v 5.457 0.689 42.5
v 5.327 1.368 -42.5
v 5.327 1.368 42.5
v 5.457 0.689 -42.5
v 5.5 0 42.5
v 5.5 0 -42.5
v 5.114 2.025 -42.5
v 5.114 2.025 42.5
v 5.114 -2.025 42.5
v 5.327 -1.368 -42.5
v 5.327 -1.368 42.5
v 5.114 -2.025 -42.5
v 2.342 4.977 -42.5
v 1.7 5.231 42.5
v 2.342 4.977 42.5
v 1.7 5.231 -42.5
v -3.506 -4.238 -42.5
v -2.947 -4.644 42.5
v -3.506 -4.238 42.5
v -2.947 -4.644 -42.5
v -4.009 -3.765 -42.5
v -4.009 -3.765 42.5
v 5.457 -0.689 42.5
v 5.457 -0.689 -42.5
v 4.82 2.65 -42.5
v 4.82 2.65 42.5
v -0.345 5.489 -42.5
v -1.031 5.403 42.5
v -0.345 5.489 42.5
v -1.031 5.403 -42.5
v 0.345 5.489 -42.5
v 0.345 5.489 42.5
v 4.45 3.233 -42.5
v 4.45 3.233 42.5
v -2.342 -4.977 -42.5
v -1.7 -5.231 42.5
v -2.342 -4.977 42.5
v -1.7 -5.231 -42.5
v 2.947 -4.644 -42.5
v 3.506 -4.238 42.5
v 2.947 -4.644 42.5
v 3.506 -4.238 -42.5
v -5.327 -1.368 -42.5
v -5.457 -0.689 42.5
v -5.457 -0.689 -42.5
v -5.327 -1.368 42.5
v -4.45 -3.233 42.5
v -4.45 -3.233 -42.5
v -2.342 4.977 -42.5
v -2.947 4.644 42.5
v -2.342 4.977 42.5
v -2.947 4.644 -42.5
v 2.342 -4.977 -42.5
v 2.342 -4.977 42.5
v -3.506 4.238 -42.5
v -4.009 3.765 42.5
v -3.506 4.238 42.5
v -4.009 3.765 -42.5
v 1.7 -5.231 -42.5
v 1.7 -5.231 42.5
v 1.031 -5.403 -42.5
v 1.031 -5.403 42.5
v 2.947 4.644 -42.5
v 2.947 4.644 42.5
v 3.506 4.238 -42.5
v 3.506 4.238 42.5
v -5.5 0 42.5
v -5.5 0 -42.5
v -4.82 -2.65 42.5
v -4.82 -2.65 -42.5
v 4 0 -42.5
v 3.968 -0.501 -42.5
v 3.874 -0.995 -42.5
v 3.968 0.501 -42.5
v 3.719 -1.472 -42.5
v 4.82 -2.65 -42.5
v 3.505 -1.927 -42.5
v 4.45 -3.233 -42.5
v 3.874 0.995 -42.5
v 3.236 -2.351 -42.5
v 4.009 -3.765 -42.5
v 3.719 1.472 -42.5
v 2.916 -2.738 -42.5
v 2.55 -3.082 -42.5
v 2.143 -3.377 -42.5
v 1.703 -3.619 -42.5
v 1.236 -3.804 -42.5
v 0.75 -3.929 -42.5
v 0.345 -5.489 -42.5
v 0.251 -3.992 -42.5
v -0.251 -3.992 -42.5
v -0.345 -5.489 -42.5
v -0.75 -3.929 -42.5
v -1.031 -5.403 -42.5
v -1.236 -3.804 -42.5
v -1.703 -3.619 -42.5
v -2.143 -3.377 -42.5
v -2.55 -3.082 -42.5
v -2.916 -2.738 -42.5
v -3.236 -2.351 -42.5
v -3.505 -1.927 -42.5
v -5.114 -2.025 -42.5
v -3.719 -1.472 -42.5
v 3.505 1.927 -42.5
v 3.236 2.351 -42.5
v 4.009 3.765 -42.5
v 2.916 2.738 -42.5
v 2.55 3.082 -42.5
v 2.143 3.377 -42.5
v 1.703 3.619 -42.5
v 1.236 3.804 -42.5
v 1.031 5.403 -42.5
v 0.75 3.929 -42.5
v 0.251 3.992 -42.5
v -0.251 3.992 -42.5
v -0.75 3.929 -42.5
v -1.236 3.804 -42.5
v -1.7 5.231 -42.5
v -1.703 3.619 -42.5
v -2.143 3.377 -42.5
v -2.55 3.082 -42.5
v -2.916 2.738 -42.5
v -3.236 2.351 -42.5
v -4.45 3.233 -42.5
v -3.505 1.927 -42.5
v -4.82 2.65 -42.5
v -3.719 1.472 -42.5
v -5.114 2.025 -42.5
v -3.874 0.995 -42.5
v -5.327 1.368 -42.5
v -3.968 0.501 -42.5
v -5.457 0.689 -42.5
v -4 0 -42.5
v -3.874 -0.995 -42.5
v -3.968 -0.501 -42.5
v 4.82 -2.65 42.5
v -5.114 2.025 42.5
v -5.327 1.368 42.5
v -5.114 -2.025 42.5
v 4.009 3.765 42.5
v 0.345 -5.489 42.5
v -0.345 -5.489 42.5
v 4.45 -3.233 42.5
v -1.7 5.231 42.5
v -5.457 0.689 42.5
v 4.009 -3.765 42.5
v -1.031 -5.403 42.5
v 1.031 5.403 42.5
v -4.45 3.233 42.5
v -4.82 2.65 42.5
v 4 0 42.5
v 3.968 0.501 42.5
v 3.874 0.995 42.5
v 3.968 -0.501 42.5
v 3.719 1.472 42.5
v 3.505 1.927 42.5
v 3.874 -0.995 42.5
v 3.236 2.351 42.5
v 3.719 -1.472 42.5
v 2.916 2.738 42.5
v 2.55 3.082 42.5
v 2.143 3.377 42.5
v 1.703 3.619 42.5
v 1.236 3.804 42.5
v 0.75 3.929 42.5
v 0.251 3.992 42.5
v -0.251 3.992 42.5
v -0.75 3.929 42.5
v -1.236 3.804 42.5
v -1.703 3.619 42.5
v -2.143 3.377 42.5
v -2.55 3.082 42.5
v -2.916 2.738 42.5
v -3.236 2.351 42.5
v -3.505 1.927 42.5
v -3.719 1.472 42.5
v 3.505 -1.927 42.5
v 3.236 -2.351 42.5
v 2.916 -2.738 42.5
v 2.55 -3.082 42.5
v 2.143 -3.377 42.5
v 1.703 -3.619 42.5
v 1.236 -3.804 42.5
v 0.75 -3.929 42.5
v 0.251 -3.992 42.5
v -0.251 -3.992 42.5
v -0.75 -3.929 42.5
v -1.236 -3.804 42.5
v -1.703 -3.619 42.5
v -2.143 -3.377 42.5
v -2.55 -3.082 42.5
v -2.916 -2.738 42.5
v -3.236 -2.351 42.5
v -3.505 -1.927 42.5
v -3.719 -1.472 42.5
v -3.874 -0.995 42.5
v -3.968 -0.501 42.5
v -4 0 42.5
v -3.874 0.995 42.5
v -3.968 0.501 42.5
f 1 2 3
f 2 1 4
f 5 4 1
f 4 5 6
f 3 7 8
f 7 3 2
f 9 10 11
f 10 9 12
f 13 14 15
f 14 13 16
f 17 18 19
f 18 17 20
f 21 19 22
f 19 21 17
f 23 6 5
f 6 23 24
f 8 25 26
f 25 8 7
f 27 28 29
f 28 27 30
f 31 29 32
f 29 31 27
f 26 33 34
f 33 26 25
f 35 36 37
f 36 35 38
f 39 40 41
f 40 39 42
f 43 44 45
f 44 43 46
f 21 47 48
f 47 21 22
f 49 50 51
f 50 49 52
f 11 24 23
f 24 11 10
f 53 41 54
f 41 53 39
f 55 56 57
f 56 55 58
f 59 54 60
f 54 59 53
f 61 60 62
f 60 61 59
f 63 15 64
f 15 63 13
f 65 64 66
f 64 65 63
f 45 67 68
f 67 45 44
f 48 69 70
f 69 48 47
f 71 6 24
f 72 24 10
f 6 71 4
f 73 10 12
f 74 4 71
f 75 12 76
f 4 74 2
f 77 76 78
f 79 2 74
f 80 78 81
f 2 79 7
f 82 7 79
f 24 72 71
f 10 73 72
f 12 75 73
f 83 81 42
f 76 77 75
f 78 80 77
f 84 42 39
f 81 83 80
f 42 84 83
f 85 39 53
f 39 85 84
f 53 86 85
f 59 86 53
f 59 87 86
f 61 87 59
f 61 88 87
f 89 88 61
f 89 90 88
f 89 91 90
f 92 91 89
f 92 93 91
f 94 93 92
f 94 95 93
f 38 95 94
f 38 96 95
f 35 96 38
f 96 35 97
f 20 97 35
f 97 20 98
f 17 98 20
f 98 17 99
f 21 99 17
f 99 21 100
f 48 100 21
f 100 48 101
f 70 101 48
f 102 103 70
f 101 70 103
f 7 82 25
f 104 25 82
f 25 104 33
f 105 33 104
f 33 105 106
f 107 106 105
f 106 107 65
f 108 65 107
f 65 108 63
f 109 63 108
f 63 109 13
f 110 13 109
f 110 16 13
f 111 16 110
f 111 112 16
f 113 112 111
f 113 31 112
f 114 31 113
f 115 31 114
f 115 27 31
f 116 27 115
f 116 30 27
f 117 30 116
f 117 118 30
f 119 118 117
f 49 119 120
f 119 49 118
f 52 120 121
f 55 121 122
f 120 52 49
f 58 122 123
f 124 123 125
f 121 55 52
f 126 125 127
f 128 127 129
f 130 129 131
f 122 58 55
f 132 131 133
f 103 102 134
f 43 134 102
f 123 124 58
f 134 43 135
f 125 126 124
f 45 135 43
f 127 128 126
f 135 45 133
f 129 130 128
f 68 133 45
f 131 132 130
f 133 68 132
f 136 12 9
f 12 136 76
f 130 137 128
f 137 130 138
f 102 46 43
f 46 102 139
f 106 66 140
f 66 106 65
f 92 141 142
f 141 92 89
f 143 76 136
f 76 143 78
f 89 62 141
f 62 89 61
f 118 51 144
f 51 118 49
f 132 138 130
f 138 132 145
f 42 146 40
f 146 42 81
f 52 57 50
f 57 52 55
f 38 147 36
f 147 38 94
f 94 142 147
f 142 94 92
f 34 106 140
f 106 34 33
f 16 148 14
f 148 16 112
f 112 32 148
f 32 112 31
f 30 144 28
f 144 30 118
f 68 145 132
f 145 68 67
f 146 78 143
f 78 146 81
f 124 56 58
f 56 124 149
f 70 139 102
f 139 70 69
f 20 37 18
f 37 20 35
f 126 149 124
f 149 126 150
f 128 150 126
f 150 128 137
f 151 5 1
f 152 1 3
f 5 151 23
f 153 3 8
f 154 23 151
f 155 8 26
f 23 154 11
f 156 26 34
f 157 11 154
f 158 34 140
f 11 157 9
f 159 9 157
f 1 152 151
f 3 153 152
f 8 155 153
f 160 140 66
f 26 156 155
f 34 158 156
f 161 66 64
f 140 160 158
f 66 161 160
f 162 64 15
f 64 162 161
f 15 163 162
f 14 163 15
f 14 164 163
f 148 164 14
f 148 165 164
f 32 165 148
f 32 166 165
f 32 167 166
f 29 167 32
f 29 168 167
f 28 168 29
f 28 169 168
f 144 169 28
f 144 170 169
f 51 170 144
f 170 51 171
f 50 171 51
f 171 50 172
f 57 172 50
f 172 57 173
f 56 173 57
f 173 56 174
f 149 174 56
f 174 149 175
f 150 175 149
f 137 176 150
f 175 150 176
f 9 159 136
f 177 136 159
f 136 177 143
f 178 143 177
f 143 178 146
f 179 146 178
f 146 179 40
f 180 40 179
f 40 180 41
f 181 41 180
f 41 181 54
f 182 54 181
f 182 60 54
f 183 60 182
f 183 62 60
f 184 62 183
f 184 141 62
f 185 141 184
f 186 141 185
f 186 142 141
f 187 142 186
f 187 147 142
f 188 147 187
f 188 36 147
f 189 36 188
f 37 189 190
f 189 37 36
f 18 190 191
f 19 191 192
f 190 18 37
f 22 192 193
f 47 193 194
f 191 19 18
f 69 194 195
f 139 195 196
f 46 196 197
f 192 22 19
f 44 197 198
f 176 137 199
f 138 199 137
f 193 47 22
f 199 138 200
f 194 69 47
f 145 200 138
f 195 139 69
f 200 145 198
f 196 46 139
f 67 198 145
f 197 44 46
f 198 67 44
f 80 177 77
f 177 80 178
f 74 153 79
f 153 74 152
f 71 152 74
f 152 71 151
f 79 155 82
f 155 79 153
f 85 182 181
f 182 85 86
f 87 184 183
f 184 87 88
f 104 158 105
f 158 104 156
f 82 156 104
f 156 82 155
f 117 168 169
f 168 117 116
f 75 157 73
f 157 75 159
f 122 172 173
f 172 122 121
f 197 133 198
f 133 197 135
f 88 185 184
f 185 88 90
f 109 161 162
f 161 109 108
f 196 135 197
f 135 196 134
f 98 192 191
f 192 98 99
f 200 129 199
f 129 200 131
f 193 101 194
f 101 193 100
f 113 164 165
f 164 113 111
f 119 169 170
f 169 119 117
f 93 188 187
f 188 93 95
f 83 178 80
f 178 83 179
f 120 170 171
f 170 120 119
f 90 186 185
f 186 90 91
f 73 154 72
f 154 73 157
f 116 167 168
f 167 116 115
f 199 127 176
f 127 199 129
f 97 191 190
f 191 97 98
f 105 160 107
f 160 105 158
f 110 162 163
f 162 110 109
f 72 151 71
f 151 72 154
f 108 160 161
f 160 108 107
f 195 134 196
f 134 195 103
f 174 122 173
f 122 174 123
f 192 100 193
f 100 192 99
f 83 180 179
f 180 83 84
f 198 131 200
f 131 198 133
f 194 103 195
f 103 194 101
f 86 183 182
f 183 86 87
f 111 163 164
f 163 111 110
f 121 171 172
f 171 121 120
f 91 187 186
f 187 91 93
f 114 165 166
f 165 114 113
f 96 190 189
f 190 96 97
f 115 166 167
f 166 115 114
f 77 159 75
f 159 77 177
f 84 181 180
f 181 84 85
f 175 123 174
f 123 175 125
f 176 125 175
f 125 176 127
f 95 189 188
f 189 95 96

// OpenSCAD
$fn = 50;


difference() {
	union() {
		translate(v = [0, 0, -42.5000000000]) {
			cylinder(h = 85, r = 5.5000000000);
		}
	}
	union() {
		translate(v = [0, 0, -100.0000000000]) {
			cylinder(h = 200, r = 4.0000000000);
		}
	}
}
